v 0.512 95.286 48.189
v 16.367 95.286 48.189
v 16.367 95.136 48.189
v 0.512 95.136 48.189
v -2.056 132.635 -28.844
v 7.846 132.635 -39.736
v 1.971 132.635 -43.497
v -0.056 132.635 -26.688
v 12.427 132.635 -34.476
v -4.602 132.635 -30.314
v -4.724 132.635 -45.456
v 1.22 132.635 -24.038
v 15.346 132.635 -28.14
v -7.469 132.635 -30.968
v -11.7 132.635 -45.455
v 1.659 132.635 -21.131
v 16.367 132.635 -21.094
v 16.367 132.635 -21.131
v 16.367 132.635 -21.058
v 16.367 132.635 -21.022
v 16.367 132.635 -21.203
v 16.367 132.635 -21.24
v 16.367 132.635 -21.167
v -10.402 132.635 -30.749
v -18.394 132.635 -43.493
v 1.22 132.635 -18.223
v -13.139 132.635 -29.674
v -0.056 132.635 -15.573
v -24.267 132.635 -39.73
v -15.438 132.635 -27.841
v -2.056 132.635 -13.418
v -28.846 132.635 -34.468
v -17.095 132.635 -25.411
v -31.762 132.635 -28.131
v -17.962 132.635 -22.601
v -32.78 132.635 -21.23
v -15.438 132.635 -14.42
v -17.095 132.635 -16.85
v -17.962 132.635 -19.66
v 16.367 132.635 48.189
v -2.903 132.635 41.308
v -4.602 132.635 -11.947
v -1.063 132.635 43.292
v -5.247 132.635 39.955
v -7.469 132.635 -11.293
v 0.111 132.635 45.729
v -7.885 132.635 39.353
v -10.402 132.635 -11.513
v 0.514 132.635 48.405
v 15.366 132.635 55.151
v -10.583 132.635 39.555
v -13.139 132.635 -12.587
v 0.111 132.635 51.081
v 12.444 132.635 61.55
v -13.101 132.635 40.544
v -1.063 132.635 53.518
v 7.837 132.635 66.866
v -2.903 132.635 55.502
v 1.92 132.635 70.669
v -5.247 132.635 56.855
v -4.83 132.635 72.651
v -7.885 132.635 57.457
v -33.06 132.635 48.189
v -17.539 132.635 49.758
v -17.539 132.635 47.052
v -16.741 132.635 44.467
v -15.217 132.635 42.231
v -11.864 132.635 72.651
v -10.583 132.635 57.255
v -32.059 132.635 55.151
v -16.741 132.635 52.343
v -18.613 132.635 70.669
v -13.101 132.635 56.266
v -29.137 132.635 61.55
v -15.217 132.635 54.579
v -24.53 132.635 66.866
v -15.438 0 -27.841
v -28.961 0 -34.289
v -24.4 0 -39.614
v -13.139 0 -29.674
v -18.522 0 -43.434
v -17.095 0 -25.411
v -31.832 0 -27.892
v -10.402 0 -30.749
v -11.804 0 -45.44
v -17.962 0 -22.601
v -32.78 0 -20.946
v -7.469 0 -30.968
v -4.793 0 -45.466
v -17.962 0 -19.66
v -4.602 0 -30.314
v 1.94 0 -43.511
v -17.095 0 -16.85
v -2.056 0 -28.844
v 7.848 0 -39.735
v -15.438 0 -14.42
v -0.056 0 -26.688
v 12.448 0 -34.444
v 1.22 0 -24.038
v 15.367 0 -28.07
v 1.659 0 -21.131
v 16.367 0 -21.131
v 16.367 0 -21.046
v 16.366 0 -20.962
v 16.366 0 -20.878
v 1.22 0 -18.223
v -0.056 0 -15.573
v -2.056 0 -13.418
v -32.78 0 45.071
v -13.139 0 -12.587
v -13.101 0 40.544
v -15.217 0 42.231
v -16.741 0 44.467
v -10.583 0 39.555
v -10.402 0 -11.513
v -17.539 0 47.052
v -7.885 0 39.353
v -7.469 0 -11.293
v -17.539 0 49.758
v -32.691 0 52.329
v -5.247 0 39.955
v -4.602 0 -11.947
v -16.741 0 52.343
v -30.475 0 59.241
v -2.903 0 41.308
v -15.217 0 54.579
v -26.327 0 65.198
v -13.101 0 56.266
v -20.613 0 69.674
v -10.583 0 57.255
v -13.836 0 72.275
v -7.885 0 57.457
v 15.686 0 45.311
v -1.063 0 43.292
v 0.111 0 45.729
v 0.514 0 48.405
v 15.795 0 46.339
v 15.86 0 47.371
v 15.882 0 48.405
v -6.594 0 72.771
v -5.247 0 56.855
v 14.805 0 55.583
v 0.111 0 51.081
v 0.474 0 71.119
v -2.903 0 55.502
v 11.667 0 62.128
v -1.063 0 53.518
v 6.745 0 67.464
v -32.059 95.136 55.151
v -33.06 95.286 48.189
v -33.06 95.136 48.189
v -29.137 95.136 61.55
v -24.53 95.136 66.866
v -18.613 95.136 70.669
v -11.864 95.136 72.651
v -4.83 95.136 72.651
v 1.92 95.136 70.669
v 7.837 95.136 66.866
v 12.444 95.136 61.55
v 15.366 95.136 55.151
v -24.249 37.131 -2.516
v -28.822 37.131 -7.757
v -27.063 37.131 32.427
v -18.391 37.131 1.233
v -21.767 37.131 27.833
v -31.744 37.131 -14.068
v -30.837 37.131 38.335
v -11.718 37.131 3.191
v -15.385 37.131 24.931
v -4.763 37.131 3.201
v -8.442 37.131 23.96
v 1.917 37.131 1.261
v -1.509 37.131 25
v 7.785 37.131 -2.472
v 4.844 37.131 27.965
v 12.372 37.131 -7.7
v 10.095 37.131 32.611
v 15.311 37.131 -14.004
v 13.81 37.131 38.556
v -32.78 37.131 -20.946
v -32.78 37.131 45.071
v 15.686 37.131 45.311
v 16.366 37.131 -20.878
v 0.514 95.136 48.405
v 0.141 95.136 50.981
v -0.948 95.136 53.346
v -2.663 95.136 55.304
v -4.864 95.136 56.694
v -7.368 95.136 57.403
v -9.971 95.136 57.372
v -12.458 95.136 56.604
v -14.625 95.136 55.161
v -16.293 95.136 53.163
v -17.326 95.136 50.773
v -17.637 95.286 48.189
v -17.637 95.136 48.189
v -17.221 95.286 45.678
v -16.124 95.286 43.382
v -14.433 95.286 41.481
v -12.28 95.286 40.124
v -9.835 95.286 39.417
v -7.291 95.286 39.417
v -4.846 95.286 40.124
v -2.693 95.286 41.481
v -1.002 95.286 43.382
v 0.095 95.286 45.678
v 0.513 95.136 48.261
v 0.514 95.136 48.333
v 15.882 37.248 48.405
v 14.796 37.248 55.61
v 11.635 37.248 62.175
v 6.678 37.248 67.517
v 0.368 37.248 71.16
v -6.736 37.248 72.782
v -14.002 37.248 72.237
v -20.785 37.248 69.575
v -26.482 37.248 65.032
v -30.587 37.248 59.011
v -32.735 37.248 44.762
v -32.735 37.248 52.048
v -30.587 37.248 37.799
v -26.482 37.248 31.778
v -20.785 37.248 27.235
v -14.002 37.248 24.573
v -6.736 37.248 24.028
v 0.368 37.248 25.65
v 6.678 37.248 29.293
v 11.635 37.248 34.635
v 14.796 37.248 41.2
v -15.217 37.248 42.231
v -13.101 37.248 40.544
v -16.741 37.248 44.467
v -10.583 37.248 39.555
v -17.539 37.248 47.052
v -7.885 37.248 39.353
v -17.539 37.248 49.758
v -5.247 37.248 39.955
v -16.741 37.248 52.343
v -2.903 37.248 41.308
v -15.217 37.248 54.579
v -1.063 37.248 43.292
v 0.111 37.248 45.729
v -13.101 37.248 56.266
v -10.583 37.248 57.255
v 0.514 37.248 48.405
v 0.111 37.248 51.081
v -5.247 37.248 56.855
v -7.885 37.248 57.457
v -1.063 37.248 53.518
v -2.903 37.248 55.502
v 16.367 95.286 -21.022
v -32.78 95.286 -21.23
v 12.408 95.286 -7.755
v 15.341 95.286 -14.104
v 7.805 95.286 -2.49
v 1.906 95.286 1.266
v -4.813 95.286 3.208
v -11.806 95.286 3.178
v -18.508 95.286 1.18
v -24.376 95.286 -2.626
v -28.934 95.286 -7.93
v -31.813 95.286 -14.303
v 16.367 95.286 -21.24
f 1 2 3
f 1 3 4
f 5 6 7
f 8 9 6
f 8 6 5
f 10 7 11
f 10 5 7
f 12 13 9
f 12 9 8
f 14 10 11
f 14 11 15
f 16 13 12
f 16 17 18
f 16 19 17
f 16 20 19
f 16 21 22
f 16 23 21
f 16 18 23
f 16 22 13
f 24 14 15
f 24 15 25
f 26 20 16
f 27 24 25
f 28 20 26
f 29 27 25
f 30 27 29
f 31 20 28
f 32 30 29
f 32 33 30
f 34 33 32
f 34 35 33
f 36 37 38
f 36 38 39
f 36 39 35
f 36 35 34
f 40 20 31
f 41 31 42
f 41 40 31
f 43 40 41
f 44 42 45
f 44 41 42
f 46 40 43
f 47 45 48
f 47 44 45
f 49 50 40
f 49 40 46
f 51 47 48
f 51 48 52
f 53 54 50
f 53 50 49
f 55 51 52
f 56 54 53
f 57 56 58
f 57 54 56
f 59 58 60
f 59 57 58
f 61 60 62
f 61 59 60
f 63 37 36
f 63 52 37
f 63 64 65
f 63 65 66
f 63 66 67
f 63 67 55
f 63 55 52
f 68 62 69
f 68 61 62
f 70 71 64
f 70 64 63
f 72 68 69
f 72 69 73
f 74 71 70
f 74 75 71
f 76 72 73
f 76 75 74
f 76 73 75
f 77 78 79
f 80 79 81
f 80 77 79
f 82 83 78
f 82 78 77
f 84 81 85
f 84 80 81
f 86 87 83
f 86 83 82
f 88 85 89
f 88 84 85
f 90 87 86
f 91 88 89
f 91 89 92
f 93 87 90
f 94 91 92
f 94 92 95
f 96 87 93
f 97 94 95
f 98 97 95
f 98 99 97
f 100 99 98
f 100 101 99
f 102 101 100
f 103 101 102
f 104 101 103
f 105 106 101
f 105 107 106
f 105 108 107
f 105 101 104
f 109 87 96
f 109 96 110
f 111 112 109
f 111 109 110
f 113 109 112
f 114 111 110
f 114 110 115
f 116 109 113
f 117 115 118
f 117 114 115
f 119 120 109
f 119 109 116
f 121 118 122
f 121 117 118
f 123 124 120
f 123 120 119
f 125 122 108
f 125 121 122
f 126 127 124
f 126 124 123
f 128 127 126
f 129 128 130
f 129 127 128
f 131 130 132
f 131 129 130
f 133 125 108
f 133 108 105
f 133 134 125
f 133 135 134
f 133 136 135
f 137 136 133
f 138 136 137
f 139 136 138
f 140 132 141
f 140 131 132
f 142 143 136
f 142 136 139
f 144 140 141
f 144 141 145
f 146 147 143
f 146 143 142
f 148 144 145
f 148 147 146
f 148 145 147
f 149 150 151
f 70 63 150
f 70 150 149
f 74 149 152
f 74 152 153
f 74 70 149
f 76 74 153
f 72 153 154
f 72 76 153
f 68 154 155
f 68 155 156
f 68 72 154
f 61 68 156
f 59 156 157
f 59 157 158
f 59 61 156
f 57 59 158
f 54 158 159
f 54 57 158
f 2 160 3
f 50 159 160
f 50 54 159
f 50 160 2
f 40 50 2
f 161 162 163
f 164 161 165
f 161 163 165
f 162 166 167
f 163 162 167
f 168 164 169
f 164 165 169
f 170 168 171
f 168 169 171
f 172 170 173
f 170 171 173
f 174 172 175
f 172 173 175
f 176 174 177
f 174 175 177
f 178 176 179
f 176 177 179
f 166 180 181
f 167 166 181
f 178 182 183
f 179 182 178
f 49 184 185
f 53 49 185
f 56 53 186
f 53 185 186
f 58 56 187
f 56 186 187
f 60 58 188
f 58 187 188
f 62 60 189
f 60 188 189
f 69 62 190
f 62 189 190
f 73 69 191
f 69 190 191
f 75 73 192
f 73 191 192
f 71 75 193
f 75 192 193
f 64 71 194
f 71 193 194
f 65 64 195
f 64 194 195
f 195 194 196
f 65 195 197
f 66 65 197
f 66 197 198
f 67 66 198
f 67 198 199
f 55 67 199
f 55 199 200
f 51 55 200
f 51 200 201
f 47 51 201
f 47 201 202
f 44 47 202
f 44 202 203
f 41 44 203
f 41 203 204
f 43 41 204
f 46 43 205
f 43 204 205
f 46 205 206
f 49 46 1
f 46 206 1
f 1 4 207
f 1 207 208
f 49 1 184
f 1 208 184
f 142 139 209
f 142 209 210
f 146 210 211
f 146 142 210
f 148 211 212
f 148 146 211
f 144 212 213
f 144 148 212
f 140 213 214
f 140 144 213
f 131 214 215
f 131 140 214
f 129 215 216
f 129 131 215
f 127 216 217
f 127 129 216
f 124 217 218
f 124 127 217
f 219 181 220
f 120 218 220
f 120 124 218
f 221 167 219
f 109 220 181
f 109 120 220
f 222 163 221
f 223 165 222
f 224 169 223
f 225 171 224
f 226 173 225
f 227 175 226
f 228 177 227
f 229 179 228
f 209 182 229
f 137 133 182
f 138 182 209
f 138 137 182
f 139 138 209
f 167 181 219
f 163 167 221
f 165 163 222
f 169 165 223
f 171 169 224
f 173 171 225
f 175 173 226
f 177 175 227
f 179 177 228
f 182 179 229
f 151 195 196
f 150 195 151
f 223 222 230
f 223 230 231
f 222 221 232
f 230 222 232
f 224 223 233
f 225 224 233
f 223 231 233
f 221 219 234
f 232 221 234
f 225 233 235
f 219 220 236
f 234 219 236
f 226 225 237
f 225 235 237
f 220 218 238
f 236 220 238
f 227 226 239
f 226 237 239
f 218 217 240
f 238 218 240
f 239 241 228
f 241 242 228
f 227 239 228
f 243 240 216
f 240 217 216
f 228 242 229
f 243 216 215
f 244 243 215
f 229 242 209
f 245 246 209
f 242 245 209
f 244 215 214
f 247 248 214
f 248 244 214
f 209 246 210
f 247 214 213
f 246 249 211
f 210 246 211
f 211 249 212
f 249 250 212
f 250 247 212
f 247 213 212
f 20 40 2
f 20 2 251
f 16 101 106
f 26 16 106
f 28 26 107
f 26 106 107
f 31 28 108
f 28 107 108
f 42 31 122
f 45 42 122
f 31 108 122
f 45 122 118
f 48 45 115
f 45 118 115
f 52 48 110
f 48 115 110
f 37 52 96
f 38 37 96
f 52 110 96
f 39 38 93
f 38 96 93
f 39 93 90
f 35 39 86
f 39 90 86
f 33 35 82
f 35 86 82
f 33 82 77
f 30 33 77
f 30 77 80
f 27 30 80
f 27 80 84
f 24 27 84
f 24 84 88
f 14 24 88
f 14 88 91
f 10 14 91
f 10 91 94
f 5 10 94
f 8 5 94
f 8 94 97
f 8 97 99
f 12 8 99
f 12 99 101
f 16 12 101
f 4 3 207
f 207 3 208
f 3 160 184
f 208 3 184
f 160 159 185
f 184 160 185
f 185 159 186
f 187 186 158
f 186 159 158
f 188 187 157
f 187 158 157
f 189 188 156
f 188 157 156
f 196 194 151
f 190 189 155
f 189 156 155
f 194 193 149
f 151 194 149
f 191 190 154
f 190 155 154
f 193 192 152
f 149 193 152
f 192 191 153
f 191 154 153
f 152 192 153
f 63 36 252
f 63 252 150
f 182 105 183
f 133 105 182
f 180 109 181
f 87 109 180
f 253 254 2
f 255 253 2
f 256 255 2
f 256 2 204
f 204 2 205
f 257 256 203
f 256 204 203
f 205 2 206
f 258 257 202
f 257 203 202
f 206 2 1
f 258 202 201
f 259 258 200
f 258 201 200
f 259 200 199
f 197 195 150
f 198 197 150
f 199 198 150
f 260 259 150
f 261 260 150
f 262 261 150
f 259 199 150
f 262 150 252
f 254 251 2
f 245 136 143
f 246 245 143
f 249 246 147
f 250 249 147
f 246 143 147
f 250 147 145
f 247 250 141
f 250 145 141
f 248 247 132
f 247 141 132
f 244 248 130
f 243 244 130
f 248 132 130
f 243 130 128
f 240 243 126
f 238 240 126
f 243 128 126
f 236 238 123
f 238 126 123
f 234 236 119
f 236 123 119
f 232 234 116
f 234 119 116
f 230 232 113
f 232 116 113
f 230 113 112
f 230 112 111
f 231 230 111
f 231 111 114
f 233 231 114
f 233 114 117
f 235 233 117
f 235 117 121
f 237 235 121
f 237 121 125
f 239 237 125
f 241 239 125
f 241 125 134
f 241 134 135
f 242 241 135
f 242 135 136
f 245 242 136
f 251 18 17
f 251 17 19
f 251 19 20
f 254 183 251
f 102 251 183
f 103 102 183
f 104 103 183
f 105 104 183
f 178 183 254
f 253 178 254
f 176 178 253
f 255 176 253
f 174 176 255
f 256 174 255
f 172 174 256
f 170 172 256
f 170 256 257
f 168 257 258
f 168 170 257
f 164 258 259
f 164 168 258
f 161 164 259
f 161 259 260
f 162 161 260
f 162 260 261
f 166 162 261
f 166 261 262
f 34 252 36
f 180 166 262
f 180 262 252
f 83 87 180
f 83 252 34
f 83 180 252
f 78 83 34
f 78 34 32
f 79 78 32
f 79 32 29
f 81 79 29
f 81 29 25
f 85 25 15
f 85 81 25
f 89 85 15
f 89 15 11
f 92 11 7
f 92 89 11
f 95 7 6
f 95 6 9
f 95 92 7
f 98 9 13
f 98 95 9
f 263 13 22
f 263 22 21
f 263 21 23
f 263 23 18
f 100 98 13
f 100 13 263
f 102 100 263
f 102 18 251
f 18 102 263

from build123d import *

# Parameters (mm, degrees)
F0_R      = 24.5736759636
F1_DEPTH  = 132.6354444027
F3_DEPTH  = 37.1311903
F5_DEPTH  = 37.3494811356
F6_R      = 24.4451738852
F7_DEPTH  = 37.2475758195
F9_DEPTH  = 37.4989584088
F10_R     = 9.0771573753
F11_DEPTH = 132.6364444027
F12_R     = 9.865321572
F13_DEPTH = 132.6364444027


with BuildPart() as f1:
    # F0 (on Front) → F1 (new body)
    with BuildSketch(Plane.XZ):
        with Locations((-8.2066878676, -21.1306065321)):
            Circle(F0_R)
    extrude(amount=-F1_DEPTH)

    # F2 (on face) → F3 (join)
    with BuildSketch(Plane.XZ):
        with BuildLine():
            ThreePointArc((-32.7796682644, -20.9457152509), (-32.7803638313, -21.1306065321), (-32.7796682644, -21.3154978133))
            Line((-32.7796682644, -21.3154978133), (-32.7796682644, -20.9457152509))
        make_face()
        with BuildLine():
            Line((-32.7796682644, 48.4050292678), (-32.7796682644, -20.9457152509))
            ThreePointArc((-32.7796682644, -20.9457152509), (-8.240472411, 3.4430462076), (16.3656912495, -20.8781488397))
            Line((16.3656912495, -20.8781488397), (15.6538728625, 48.4050292678))
            Line((15.6538728625, 48.4050292678), (-32.7796682644, 48.4050292678))
        make_face()
    extrude(amount=-F3_DEPTH)

    # F4 (on face) → F5 (join)
    with BuildSketch(Plane(origin=(0, 132.6354444027, 0), x_dir=(-1, 0, 0), z_dir=(0, 1, 0))):
        with BuildLine():
            Line((-16.3667459156, 48.1888727813), (-16.3667459156, -21.2397049542))
            ThreePointArc((-16.3667459156, -21.2397049542), (8.2016739749, 3.3337506723), (32.7801643053, -21.2296324502))
            Line((32.7801643053, -21.2296324502), (33.0599062145, 48.1888727813))
            Line((33.0599062145, 48.1888727813), (-16.3667459156, 48.1888727813))
        make_face()
    extrude(amount=-F5_DEPTH)

    # F6 (on face) → F7 (join)
    with BuildSketch(Plane.XZ):
        with Locations((-8.562897701, 48.4050292678)):
            Circle(F6_R)
    extrude(amount=-F7_DEPTH)

    # F8 (on face) → F9 (join)
    with BuildSketch(Plane(origin=(0, 132.6354444027, 0), x_dir=(-1, 0, 0), z_dir=(0, 1, 0))):
        with BuildLine():
            Line((-16.3667459156, 48.1888727813), (33.0599062145, 48.1888727813))
            ThreePointArc((33.0599062145, 48.1888727813), (8.3465801494, 72.9021988463), (-16.3667459156, 48.1888727813))
        make_face()
    extrude(amount=-F9_DEPTH)

    # F10 (on face) → F11 (cut, through all)
    with BuildSketch(Plane.XZ):
        with Locations((-8.562897701, 48.4050292678)):
            Circle(F10_R)
    extrude(amount=-F11_DEPTH, mode=Mode.SUBTRACT)

    # F12 (on face) → F13 (cut, through all)
    with BuildSketch(Plane.XZ):
        with Locations((-8.2066878676, -21.1306065321)):
            Circle(F12_R)
    extrude(amount=-F13_DEPTH, mode=Mode.SUBTRACT)


solid = f1.part
